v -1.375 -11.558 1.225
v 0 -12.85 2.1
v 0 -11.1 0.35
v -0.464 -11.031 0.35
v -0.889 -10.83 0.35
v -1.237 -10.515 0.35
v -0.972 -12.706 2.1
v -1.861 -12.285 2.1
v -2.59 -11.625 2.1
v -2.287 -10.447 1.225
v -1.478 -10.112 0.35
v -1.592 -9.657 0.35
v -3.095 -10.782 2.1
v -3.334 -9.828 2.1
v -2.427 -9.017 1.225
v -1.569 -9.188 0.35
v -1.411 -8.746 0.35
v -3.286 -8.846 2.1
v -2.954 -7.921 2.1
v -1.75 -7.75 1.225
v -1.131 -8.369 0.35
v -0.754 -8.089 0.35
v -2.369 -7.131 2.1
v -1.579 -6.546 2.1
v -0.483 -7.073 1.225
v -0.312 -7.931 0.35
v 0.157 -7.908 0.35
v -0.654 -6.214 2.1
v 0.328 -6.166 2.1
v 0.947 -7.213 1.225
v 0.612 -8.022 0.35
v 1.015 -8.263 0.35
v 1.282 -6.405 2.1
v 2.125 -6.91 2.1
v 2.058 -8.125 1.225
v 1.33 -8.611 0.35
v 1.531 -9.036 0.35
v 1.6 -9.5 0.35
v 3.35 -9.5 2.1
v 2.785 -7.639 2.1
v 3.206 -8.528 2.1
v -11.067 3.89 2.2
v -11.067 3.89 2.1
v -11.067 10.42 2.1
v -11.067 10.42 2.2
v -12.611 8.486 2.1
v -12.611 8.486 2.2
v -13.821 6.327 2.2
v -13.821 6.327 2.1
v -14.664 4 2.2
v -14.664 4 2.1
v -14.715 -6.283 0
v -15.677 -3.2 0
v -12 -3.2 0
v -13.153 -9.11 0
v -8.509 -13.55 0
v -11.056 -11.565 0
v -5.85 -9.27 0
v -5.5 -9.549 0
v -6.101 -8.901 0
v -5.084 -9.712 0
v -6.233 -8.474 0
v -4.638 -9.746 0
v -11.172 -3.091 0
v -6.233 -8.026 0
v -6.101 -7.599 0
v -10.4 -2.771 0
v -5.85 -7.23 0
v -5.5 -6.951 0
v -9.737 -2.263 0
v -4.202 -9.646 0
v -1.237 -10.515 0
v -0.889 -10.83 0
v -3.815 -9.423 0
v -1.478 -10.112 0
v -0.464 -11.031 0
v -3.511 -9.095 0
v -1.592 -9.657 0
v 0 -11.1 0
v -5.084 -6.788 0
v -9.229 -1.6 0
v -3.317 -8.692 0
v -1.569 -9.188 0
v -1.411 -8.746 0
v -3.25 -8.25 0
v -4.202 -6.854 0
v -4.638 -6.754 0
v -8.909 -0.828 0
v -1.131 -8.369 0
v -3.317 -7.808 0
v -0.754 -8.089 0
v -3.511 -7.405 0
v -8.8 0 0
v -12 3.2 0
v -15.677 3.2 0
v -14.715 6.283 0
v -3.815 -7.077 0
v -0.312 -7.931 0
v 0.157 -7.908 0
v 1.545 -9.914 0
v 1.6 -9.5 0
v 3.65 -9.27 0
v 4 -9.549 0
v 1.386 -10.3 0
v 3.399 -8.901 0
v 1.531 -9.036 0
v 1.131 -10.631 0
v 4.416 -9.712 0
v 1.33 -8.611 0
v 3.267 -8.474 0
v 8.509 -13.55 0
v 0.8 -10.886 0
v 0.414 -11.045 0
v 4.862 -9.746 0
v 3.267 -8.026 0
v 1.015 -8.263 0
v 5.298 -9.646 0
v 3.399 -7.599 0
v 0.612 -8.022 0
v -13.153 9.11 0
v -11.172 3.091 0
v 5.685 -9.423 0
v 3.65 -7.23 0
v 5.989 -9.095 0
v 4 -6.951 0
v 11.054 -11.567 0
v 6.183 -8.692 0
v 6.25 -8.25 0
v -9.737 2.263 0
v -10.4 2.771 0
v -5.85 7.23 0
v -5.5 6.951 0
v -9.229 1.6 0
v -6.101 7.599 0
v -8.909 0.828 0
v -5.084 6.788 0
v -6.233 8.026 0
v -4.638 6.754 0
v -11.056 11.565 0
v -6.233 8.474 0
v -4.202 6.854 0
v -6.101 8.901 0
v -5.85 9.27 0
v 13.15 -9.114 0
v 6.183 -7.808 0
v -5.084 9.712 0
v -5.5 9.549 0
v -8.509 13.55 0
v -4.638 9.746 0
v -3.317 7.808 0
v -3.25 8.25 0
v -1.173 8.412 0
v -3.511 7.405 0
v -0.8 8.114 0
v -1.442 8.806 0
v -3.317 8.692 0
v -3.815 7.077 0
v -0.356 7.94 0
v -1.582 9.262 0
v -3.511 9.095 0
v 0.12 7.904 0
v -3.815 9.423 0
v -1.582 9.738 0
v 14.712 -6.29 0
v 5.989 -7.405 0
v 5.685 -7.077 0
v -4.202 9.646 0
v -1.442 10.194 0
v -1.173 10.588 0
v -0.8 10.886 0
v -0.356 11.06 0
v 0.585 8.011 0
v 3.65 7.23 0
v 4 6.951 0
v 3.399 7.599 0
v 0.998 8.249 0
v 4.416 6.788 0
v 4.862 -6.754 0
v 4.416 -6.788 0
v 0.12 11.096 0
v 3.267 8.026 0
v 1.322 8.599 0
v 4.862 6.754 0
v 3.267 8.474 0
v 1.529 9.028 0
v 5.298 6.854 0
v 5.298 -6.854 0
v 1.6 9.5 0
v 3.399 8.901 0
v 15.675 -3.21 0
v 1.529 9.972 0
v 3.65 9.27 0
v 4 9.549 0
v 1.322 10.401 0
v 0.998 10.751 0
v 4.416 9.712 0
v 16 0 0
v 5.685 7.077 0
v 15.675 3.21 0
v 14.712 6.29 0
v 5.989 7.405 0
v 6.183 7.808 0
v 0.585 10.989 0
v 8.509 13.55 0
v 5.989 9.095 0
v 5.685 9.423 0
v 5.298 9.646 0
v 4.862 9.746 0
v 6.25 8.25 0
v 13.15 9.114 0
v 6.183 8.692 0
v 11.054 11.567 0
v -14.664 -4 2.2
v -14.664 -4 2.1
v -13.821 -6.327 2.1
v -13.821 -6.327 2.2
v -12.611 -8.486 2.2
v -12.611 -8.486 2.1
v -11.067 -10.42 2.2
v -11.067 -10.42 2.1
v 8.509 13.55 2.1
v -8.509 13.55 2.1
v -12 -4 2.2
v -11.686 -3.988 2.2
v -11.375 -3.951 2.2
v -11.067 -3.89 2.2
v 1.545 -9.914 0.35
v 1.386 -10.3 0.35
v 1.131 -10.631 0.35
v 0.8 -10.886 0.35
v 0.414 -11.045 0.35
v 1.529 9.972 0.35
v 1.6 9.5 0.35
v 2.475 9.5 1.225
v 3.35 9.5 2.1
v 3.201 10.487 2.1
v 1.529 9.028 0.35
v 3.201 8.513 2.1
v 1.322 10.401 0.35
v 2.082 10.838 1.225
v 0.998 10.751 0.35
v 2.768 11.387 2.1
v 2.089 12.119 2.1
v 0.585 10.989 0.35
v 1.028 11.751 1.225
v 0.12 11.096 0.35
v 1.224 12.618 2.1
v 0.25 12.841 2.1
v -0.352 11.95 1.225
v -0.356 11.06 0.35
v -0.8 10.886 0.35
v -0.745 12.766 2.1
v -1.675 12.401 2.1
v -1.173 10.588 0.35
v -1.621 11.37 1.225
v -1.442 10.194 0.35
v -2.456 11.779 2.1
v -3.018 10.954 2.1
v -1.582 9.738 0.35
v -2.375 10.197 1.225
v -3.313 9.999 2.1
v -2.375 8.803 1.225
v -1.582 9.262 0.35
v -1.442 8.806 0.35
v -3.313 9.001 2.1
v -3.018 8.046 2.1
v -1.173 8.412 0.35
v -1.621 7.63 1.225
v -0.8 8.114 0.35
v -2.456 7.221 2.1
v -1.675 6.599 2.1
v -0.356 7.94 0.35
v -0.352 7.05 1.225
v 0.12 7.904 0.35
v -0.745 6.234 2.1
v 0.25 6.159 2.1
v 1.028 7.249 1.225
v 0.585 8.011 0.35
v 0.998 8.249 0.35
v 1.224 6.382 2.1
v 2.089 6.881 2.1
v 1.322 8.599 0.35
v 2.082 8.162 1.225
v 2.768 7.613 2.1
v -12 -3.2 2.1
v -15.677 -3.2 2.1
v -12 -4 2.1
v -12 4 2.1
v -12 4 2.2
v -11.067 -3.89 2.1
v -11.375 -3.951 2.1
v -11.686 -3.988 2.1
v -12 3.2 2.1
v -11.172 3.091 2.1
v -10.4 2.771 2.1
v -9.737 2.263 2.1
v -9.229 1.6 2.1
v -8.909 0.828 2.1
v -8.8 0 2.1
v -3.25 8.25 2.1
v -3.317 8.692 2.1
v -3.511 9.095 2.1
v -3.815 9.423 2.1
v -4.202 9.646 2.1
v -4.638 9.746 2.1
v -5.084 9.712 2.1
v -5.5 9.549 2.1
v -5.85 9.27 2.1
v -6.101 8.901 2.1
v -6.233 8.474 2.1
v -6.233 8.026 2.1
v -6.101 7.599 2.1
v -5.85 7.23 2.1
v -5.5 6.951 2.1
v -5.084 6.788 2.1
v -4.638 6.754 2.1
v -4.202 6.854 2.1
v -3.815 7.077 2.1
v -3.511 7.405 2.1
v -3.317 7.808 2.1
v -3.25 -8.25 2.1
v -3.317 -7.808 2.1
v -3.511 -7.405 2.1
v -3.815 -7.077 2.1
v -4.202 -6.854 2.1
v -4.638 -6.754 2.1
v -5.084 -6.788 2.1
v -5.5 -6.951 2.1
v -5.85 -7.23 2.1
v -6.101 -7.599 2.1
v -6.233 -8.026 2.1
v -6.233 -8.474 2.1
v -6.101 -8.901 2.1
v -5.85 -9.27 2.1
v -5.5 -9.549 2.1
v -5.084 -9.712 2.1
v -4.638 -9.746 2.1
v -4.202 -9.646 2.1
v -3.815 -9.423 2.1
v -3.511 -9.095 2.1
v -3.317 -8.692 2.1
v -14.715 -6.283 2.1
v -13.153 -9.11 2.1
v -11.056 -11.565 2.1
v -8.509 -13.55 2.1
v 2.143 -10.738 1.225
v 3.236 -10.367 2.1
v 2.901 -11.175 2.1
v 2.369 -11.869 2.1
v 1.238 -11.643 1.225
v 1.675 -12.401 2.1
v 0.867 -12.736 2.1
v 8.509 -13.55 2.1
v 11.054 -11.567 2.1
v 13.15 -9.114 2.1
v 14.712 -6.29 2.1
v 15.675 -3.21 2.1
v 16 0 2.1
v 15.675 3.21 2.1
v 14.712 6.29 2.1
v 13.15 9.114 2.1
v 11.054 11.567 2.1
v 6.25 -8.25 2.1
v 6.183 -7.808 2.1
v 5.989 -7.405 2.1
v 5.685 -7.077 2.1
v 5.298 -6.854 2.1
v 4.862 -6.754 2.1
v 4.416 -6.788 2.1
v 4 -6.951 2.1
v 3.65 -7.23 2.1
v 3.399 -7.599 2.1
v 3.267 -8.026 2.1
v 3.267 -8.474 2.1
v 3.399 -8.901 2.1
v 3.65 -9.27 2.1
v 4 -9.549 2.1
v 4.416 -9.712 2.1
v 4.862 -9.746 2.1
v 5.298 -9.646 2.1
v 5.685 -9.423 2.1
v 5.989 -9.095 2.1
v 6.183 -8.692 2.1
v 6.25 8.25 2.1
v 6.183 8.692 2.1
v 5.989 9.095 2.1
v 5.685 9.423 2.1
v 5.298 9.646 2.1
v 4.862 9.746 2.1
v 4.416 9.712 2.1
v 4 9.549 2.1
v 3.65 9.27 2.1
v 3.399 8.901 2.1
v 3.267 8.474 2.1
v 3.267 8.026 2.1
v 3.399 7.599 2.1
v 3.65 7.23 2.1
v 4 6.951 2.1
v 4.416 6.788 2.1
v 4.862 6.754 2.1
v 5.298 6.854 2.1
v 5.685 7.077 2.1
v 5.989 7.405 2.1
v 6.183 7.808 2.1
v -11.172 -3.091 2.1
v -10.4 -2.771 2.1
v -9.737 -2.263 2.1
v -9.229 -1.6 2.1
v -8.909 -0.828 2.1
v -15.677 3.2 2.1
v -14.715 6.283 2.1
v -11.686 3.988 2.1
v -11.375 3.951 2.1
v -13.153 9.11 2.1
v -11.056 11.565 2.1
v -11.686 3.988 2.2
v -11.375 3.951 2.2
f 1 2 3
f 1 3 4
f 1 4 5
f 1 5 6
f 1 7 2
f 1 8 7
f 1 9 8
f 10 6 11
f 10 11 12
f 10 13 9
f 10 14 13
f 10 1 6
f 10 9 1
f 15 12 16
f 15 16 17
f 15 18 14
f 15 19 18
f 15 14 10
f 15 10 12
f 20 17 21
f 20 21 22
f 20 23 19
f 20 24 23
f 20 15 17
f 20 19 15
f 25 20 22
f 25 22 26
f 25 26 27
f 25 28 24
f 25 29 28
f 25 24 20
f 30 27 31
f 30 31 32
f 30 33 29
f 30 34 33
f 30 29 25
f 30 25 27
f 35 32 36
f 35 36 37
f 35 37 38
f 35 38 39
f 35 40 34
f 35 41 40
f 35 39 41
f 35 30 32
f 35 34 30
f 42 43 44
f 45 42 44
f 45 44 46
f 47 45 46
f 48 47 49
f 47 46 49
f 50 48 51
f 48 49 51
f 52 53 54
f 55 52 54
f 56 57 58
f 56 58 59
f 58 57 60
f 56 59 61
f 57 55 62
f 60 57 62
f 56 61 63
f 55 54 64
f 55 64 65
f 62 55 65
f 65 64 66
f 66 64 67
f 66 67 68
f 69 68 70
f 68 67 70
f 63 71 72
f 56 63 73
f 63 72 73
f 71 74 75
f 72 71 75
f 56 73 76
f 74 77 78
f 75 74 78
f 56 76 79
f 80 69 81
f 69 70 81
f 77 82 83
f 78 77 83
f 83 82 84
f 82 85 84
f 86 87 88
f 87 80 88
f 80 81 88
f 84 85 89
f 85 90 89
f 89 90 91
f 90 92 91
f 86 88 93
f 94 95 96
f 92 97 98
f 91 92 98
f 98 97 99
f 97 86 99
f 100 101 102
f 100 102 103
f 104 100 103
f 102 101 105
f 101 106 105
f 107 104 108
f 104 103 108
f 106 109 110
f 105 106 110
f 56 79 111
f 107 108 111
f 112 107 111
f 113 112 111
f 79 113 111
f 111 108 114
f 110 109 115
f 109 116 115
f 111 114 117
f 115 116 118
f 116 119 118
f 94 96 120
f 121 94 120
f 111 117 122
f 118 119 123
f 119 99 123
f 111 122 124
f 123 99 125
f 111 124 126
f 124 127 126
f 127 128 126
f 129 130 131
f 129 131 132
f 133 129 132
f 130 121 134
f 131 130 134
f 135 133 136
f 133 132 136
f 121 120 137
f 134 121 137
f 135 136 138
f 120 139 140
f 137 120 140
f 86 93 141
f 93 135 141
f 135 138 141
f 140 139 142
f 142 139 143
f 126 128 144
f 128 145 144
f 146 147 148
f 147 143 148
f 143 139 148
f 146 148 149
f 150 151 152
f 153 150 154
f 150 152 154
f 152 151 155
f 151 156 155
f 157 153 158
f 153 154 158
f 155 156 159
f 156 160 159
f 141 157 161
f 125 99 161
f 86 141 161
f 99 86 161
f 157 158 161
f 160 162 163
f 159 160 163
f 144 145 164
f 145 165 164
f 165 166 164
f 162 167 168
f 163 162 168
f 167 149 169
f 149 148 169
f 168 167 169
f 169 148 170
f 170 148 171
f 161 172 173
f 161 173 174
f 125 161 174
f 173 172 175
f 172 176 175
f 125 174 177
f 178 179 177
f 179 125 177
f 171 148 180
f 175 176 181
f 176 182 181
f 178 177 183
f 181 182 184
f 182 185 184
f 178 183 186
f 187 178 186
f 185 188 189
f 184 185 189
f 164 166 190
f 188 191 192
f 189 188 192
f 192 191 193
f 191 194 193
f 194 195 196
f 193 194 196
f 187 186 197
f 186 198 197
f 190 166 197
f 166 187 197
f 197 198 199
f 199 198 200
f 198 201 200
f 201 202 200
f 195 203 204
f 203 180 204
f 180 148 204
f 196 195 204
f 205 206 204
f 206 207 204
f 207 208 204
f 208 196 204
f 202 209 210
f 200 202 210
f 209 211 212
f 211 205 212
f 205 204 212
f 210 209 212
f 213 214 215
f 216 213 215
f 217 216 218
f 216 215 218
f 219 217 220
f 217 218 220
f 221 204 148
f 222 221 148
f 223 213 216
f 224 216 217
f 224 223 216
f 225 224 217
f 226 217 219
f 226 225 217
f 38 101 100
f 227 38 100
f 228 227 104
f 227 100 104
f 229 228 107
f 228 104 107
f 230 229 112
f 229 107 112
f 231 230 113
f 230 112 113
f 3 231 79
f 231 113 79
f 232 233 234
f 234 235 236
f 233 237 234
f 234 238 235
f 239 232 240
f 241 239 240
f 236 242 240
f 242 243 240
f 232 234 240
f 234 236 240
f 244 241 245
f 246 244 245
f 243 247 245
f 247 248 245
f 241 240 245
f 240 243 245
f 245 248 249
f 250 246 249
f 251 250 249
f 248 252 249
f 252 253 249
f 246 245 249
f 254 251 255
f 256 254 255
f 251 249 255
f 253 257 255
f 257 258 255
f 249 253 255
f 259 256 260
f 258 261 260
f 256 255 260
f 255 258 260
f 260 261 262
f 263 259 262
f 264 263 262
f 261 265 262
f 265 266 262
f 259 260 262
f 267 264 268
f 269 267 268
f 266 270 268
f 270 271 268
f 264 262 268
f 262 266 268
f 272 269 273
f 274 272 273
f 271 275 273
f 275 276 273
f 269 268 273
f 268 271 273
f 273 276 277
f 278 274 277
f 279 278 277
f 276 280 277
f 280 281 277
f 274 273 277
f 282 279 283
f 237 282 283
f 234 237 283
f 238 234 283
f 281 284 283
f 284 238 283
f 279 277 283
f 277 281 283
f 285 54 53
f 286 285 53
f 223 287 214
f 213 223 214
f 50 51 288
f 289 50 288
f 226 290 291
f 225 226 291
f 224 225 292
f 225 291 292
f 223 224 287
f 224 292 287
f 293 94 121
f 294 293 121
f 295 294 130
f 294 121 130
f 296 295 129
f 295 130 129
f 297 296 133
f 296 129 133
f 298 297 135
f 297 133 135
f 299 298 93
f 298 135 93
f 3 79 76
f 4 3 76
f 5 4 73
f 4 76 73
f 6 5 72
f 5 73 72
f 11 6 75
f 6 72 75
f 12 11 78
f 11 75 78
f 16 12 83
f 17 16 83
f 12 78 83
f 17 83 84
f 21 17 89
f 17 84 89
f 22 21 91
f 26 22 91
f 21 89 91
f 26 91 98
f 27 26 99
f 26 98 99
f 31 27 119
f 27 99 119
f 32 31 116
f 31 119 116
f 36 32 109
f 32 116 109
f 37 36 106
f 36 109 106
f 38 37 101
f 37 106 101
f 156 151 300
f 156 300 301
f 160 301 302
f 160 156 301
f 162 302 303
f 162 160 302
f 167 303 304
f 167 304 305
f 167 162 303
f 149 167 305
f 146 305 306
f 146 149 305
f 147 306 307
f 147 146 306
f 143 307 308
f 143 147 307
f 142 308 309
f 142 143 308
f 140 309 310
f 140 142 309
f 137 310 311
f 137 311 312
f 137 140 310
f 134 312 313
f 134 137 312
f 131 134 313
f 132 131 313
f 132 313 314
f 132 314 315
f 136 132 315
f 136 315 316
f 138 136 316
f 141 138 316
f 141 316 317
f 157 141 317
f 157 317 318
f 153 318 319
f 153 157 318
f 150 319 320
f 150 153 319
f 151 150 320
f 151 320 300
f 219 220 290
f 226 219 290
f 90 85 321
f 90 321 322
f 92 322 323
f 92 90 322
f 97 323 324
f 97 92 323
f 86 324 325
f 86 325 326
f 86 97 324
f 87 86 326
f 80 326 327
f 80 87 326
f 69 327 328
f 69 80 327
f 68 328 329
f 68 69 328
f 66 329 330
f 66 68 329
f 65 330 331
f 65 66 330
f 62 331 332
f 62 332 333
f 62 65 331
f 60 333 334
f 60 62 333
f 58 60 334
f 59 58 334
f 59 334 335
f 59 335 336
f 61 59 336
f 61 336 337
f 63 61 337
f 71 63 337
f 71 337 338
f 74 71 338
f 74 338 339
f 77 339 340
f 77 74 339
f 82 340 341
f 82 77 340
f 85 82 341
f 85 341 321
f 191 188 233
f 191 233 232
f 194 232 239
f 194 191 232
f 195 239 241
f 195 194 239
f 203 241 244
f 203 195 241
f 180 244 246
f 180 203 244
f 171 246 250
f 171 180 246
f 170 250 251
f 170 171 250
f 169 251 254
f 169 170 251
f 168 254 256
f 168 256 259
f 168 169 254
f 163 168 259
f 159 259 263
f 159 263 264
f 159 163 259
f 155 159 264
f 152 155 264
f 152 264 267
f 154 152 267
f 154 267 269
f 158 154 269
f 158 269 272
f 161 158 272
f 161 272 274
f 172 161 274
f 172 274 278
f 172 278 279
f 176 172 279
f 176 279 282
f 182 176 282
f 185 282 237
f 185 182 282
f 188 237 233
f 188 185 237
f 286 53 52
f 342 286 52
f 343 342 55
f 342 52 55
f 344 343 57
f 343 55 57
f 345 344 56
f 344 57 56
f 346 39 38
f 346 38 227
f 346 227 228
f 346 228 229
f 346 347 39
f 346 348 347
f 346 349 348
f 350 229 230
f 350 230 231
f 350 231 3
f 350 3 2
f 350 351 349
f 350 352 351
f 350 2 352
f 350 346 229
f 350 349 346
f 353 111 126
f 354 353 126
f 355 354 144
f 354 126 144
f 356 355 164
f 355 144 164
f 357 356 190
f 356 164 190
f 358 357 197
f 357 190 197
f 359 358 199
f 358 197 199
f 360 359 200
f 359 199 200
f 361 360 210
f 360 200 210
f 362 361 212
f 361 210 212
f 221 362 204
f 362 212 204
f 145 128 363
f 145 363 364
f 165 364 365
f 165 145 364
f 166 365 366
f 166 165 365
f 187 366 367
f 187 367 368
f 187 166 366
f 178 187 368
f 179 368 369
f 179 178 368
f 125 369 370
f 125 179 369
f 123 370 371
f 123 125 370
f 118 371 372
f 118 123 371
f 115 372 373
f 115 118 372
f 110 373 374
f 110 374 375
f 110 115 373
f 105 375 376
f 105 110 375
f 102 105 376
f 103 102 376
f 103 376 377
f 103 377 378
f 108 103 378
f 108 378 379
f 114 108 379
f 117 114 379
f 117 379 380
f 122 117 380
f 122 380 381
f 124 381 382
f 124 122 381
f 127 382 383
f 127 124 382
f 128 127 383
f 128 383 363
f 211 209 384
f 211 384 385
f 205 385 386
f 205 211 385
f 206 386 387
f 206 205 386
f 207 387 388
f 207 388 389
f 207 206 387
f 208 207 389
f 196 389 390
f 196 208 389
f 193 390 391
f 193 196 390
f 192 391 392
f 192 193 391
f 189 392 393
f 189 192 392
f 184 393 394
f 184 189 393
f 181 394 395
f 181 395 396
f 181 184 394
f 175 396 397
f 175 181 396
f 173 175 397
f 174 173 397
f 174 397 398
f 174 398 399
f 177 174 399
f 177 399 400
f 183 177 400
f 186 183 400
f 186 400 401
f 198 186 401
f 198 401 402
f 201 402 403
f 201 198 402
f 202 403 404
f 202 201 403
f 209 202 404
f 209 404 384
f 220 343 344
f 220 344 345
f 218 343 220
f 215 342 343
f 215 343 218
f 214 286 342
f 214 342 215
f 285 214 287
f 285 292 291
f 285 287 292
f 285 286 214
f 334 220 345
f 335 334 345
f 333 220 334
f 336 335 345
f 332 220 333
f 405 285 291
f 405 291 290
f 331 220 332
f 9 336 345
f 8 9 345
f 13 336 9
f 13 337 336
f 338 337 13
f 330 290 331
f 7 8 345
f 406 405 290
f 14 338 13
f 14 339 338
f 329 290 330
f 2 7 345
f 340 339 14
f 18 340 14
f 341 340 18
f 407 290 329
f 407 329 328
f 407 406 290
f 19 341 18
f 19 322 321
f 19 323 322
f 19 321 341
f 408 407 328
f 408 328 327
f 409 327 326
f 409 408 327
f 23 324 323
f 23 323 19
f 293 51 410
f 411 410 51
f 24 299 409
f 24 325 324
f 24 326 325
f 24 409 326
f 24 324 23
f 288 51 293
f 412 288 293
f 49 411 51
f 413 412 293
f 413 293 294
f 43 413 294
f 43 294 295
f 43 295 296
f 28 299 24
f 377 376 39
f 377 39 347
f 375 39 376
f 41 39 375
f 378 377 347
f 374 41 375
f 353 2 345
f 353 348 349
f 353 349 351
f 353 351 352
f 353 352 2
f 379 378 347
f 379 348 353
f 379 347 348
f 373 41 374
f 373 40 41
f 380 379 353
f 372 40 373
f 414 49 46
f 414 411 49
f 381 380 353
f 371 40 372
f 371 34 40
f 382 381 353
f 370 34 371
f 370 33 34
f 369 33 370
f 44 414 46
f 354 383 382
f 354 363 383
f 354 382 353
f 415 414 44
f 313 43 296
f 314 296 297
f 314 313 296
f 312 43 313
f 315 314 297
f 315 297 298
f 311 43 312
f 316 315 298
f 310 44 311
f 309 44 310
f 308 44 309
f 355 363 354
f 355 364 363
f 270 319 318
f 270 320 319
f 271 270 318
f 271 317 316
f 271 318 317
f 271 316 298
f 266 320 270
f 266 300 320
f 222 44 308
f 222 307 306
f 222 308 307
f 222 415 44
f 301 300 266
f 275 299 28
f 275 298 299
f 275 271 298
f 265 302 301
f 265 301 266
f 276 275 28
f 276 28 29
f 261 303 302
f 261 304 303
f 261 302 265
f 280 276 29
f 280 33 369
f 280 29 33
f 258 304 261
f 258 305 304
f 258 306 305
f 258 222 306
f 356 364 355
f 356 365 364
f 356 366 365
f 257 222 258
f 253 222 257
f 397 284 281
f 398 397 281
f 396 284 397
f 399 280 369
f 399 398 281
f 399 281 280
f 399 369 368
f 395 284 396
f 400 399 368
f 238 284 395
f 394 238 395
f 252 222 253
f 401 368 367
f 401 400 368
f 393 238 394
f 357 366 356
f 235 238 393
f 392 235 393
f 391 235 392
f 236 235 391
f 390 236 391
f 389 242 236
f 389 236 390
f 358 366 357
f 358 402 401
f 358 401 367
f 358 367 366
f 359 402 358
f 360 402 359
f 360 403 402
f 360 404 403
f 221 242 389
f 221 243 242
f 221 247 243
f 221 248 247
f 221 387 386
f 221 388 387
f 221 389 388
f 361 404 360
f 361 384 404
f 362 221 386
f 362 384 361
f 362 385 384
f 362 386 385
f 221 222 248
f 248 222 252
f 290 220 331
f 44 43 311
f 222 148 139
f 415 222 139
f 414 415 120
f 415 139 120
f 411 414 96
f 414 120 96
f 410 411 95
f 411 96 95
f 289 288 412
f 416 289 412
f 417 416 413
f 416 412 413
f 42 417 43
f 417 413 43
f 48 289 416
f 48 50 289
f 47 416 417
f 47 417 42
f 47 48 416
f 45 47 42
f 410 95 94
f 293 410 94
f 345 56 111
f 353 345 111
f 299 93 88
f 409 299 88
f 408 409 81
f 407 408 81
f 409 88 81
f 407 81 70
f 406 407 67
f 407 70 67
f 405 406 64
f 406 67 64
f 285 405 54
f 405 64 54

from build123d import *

# Parameters (mm, degrees)
F0_R     = 1.5
F0_R_2   = 1.6
F1_DEPTH = 2.1
F2_SIZE  = 1.75
F4_DEPTH = 0.1


with BuildPart() as f1:
    # F0 (on Top) → F1 (new body)
    with BuildSketch(Plane.XY):
        with BuildLine():
            Line((8.508672, 13.55), (-8.508672, 13.55))
            ThreePointArc((-8.508672, 13.55), (-13.153482, 9.10966), (-15.676734, 3.2))
            Line((-15.676734, 3.2), (-12, 3.2))
            ThreePointArc((-12, 3.2), (-9.737258, 2.262742), (-8.8, 0))
            ThreePointArc((-8.8, 0), (-9.737258, -2.262742), (-12, -3.2))
            Line((-12, -3.2), (-15.676734, -3.2))
            ThreePointArc((-15.676734, -3.2), (-13.153482, -9.10966), (-8.508672, -13.55))
            Line((-8.508672, -13.55), (0, -13.55))
            Line((0, -13.55), (8.508672, -13.55))
            ThreePointArc((8.508672, -13.55), (16, 0), (8.508672, 13.55))
        make_face()
        with Locations((-4.75, -8.25)):
            Circle(F0_R, mode=Mode.SUBTRACT)
        with BuildLine():
            ThreePointArc((1.6, -9.5), (1.131371, -10.631371), (0, -11.1))
            ThreePointArc((0, -11.1), (-1.131371, -8.368629), (1.6, -9.5))
        make_face(mode=Mode.SUBTRACT)
        with Locations((4.75, -8.25)):
            Circle(F0_R, mode=Mode.SUBTRACT)
        with Locations((-4.75, 8.25)):
            Circle(F0_R, mode=Mode.SUBTRACT)
        with Locations((0, 9.5)):
            Circle(F0_R_2, mode=Mode.SUBTRACT)
        with Locations((4.75, 8.25)):
            Circle(F0_R, mode=Mode.SUBTRACT)
    extrude(amount=F1_DEPTH)

    # F2
    f2_edges = [f1.edges().sort_by_distance(p)[0] for p in [
        (-1.6, -9.5, 2.1),
        (-1.6, 9.5, 2.1),
    ]]
    chamfer(f2_edges, length=F2_SIZE)

    # F3 (on face) → F4 (join)
    with BuildSketch(Plane.XY.offset(2.1)):
        with BuildLine():
            ThreePointArc((-12, 4), (-11.530048, 3.972297), (-11.066605, 3.889573))
            Line((-11.066605, 3.889573), (-11.066605, 10.419705))
            ThreePointArc((-11.066605, 10.419705), (-13.259799, 7.430863), (-14.664242, 4))
            Line((-14.664242, 4), (-12, 4))
        make_face()
        with BuildLine():
            Line((-12, -4), (-14.664242, -4))
            ThreePointArc((-14.664242, -4), (-13.259799, -7.430863), (-11.066605, -10.419705))
            Line((-11.066605, -10.419705), (-11.066605, -3.889573))
            ThreePointArc((-11.066605, -3.889573), (-11.530048, -3.972297), (-12, -4))
        make_face()
    extrude(amount=F4_DEPTH)


solid = f1.part
